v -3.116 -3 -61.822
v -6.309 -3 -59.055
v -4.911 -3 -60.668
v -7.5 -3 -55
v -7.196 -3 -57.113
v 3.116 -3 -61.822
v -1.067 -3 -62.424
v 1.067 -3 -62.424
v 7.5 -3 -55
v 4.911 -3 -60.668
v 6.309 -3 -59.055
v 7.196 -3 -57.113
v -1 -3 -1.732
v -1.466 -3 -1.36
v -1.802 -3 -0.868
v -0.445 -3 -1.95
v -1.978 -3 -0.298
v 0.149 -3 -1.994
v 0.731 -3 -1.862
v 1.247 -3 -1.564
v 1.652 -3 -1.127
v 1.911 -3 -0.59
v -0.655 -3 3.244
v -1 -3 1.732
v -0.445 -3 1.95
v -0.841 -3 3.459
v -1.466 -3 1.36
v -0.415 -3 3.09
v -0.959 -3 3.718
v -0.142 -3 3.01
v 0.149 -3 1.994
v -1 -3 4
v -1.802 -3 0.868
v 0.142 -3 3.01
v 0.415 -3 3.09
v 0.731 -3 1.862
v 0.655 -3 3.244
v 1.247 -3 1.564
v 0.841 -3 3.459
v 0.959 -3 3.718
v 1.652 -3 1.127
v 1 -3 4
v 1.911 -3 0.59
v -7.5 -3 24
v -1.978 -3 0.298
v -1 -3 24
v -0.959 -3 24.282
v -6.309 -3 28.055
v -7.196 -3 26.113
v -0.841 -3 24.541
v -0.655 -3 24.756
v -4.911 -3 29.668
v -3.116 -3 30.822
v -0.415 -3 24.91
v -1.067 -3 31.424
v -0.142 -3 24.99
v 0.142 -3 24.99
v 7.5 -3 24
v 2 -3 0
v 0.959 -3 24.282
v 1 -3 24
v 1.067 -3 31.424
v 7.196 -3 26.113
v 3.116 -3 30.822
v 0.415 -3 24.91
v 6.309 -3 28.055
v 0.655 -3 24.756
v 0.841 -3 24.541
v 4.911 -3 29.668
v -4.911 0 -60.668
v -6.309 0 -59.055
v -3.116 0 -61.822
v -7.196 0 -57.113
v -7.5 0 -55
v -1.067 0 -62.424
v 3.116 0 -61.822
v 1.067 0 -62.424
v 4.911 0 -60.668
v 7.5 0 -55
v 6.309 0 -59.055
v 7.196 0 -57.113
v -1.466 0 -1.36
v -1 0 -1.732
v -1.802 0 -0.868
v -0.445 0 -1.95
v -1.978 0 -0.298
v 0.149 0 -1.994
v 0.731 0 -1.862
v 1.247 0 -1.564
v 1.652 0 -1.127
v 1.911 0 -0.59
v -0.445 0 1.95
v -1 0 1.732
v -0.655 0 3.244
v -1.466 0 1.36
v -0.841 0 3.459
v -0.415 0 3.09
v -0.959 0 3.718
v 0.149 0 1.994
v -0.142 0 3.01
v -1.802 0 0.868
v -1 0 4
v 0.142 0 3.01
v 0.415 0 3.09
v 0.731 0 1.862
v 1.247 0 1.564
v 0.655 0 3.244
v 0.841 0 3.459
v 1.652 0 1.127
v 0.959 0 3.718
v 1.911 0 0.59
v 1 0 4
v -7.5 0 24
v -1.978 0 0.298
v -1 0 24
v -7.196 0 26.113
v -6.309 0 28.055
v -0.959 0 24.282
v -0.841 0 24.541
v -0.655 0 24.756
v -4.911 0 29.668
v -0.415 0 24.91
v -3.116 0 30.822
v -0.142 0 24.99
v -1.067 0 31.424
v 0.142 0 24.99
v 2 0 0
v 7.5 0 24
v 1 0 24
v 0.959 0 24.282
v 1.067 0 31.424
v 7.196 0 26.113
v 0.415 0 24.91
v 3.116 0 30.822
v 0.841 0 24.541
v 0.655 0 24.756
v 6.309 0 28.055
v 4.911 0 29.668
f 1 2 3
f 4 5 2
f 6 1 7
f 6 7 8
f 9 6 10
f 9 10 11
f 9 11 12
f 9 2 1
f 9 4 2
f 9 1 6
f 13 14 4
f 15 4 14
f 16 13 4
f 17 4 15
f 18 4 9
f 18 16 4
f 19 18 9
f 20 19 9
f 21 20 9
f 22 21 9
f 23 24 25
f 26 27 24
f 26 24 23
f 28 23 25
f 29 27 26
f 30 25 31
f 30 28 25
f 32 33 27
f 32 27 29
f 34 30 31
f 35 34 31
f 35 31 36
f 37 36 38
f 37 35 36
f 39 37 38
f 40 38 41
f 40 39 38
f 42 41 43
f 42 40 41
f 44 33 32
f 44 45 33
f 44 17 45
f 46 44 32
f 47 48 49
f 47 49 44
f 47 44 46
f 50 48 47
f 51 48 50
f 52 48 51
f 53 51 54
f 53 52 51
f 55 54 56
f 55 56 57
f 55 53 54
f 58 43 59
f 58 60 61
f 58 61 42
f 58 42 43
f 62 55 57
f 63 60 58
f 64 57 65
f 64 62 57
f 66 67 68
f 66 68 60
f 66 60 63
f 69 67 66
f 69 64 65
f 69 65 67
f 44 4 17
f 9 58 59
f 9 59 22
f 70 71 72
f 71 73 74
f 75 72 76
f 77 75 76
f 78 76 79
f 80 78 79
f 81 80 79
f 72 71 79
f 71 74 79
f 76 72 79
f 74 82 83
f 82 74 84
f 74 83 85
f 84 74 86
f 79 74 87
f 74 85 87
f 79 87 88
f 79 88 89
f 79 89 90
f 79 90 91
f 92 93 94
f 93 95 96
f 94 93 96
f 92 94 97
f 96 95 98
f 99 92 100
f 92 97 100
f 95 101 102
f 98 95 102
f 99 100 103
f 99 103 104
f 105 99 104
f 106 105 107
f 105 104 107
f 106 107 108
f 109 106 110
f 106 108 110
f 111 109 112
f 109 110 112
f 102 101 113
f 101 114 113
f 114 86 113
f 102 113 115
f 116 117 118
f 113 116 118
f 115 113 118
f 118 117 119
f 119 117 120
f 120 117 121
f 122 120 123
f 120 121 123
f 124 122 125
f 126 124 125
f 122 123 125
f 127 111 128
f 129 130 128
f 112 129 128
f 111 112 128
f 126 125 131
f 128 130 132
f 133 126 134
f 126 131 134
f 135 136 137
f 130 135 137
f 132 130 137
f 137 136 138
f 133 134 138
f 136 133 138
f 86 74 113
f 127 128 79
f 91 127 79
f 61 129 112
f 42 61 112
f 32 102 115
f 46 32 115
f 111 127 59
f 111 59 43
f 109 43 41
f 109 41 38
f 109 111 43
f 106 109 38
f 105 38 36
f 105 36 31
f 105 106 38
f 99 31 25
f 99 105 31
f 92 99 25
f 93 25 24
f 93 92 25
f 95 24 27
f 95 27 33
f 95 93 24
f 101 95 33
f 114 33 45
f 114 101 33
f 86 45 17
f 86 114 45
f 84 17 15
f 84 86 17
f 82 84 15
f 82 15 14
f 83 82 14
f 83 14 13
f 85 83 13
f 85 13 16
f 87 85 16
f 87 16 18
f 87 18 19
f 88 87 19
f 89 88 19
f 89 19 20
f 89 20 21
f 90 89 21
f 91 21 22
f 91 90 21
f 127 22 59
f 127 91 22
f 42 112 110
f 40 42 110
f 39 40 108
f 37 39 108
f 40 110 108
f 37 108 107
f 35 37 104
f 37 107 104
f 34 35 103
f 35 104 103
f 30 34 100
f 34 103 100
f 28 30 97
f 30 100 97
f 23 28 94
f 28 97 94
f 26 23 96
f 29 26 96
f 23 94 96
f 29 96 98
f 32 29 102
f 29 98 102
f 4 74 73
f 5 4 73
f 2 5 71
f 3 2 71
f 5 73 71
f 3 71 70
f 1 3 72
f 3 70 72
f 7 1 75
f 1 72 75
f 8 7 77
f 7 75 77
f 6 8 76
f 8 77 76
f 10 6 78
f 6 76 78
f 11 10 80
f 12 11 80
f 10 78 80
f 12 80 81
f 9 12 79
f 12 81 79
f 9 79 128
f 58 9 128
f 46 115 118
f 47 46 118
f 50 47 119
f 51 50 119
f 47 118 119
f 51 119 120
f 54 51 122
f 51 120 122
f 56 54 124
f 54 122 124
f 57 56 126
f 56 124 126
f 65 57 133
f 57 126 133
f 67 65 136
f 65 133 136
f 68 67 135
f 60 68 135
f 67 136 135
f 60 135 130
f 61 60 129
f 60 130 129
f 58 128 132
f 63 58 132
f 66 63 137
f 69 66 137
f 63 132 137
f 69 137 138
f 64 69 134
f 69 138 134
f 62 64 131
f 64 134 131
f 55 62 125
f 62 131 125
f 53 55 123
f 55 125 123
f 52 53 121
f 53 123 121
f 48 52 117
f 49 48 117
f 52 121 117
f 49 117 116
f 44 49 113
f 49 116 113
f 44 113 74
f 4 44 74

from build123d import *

# Parameters (mm, degrees)
F0_R     = 2
F1_DEPTH = 3


with BuildPart() as f1:
    # F0 (on Front) → F1 (new body)
    with BuildSketch(Plane.XZ):
        with BuildLine():
            Line((-7.5, 24), (-7.5, -55))
            ThreePointArc((-7.5, -55), (0, -62.5), (7.5, -55))
            Line((7.5, -55), (7.5, 24))
            ThreePointArc((7.5, 24), (0, 31.5), (-7.5, 24))
        make_face()
        Circle(F0_R, mode=Mode.SUBTRACT)
        with BuildLine():
            ThreePointArc((-1, 24), (0, 25), (1, 24))
            Line((1, 24), (1, 4))
            ThreePointArc((1, 4), (0, 3), (-1, 4))
            Line((-1, 4), (-1, 24))
        make_face(mode=Mode.SUBTRACT)
    extrude(amount=F1_DEPTH)


solid = f1.part
